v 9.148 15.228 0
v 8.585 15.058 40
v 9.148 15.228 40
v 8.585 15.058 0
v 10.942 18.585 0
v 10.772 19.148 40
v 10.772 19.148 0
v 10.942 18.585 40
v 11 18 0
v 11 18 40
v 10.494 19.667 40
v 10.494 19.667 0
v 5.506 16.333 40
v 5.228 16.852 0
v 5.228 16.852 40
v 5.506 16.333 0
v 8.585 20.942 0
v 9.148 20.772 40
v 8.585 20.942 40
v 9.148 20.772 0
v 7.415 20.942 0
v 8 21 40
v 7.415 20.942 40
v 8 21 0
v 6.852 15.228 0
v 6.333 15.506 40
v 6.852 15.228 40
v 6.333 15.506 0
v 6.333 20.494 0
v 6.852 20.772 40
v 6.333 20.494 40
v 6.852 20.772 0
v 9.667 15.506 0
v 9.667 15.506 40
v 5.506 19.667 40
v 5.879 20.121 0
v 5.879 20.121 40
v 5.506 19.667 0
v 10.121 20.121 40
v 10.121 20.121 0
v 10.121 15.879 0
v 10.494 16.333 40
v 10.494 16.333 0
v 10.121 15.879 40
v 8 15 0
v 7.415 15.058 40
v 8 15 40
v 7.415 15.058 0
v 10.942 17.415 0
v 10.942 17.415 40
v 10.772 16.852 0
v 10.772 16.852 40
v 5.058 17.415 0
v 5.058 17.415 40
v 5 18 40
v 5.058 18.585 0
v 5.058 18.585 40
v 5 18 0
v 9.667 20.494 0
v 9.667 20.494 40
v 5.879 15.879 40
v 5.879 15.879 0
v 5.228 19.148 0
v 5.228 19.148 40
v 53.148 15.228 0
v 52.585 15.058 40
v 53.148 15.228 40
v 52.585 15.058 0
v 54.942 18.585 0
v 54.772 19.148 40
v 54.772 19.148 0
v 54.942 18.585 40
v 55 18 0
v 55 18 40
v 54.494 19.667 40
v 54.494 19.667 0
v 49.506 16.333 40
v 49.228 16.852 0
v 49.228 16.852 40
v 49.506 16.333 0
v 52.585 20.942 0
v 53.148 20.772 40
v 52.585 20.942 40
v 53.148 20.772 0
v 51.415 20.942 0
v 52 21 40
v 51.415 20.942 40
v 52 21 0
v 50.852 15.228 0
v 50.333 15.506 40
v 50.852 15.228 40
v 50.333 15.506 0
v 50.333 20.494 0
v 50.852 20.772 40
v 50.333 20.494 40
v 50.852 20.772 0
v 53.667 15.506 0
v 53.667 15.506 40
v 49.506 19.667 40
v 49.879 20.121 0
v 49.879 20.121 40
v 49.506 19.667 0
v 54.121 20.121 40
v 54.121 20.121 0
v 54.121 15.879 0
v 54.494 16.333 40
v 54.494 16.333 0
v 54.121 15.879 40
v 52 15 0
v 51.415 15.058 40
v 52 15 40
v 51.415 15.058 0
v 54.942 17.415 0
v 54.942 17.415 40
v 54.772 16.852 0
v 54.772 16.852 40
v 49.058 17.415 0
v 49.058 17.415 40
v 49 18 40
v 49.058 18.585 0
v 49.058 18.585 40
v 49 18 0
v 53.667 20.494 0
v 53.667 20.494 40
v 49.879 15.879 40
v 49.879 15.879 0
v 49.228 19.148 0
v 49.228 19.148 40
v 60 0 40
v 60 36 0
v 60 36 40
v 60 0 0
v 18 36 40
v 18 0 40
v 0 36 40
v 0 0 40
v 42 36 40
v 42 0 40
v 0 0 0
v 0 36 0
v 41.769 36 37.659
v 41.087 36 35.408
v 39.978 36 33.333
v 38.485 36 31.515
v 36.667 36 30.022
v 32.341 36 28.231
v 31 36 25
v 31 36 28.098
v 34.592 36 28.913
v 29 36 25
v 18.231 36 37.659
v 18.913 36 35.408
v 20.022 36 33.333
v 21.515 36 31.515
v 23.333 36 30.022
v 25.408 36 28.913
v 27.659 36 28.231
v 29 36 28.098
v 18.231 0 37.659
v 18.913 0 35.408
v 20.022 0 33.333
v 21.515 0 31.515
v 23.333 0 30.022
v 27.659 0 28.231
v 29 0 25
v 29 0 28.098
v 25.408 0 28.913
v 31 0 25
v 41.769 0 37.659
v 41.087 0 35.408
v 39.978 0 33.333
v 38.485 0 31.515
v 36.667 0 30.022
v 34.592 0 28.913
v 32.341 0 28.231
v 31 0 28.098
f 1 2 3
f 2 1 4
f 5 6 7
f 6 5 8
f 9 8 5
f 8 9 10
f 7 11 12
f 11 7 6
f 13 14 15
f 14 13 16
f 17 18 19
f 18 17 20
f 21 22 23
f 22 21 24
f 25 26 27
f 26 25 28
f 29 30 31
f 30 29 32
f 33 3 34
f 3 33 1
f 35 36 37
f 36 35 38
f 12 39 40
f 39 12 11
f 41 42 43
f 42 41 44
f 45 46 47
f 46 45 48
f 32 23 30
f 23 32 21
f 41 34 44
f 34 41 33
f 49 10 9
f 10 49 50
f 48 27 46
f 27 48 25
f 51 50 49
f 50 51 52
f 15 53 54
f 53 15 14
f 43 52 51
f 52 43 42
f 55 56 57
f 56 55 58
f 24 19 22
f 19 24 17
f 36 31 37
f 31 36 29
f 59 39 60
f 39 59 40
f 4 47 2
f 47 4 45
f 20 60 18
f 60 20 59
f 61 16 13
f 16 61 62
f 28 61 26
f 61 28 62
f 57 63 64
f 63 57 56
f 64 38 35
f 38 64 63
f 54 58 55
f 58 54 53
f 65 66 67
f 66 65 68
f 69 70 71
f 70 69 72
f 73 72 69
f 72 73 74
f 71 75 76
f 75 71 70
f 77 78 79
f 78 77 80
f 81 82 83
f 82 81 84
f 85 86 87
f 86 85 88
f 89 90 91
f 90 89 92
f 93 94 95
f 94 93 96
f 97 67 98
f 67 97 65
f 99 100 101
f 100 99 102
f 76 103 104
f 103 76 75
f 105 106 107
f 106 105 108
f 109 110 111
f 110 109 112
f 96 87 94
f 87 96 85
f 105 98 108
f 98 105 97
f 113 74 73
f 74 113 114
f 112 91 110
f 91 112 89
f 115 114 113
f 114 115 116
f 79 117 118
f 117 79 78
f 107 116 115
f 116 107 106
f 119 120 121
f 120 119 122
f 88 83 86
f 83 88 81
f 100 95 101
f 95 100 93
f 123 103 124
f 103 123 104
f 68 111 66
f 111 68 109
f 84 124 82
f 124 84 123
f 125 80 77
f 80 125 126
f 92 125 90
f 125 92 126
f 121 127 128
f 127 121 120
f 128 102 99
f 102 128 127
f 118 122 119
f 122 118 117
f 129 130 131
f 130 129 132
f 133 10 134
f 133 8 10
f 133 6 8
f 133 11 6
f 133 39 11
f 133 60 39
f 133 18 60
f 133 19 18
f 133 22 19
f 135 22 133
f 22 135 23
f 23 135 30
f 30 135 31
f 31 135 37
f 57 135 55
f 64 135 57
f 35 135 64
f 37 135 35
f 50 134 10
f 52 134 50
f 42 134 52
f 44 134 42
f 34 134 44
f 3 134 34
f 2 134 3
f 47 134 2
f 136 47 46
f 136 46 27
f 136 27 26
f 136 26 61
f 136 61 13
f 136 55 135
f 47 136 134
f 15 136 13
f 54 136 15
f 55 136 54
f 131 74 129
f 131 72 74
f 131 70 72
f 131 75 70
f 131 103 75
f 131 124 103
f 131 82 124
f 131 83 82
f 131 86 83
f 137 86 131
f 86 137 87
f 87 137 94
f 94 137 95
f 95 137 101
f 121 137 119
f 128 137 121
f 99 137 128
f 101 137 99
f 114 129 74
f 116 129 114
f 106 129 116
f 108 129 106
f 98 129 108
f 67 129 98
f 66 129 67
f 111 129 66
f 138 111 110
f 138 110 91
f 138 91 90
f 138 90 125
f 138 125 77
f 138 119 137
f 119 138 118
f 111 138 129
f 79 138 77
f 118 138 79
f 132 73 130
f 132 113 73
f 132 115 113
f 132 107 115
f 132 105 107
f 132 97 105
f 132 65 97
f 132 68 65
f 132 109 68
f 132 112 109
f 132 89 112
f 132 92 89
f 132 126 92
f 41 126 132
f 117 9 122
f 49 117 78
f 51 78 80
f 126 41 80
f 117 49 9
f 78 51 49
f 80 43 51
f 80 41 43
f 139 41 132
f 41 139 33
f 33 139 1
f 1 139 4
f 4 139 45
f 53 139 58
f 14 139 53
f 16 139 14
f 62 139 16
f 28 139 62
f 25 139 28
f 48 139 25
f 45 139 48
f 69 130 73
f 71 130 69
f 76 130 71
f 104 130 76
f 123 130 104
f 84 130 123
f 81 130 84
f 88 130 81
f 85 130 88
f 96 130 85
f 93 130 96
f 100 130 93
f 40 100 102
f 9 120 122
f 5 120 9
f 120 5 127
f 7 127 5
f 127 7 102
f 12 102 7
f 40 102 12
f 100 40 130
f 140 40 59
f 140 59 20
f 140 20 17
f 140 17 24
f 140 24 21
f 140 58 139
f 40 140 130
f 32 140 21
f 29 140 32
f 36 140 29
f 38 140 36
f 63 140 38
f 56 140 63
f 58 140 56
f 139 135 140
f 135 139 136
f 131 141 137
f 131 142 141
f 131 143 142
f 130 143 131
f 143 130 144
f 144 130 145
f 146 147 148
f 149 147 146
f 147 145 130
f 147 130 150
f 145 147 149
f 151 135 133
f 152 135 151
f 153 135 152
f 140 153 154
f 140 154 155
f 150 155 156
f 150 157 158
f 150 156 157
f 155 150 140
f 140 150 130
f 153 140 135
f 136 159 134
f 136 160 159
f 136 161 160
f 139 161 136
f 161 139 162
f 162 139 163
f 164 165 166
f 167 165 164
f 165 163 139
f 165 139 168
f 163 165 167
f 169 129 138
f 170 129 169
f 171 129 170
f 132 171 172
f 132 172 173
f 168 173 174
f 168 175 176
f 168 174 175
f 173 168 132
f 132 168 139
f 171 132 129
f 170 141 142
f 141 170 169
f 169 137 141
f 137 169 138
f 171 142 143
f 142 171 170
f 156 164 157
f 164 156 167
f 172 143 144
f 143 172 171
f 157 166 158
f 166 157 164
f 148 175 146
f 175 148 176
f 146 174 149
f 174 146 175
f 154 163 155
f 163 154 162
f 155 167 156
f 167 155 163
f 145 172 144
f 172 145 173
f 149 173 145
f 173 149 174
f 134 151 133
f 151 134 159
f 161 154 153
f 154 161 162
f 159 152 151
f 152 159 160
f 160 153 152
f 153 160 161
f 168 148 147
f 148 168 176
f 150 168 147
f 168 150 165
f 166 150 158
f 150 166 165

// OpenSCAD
$fn = 32;

// ----------------------------------------------------------------------
// Saddle clamp: split shaft clamp
// ----------------------------------------------------------------------

// --- parameters (mm) ---
blk_l = 60;               // block length, X
blk_w = 36;               // block width, Y
blk_h = 40;               // block height
clamp_r = 12;             // shaft groove radius
hole_r = 3;               // bolt hole radius
hole_m = 8;               // bolt hole margin from the ends
saw_w = 2;                // saw kerf width

saw_depth = clamp_r + 3;  // saw kerf depth

difference() {
  cube([blk_l, blk_w, blk_h]);
  translate([blk_l / 2, -1, blk_h])
    rotate([-90, 0, 0])
      cylinder(h = blk_w + 2, r = clamp_r);
  for (sx = [0, 1])
    translate([sx ? blk_l - hole_m : hole_m, blk_w / 2, -1])
      cylinder(r = hole_r, h = blk_h + 2);
  translate([blk_l / 2 - saw_w / 2, -1, blk_h - saw_depth])
    cube([saw_w, blk_w + 2, saw_depth + 1]);
}
